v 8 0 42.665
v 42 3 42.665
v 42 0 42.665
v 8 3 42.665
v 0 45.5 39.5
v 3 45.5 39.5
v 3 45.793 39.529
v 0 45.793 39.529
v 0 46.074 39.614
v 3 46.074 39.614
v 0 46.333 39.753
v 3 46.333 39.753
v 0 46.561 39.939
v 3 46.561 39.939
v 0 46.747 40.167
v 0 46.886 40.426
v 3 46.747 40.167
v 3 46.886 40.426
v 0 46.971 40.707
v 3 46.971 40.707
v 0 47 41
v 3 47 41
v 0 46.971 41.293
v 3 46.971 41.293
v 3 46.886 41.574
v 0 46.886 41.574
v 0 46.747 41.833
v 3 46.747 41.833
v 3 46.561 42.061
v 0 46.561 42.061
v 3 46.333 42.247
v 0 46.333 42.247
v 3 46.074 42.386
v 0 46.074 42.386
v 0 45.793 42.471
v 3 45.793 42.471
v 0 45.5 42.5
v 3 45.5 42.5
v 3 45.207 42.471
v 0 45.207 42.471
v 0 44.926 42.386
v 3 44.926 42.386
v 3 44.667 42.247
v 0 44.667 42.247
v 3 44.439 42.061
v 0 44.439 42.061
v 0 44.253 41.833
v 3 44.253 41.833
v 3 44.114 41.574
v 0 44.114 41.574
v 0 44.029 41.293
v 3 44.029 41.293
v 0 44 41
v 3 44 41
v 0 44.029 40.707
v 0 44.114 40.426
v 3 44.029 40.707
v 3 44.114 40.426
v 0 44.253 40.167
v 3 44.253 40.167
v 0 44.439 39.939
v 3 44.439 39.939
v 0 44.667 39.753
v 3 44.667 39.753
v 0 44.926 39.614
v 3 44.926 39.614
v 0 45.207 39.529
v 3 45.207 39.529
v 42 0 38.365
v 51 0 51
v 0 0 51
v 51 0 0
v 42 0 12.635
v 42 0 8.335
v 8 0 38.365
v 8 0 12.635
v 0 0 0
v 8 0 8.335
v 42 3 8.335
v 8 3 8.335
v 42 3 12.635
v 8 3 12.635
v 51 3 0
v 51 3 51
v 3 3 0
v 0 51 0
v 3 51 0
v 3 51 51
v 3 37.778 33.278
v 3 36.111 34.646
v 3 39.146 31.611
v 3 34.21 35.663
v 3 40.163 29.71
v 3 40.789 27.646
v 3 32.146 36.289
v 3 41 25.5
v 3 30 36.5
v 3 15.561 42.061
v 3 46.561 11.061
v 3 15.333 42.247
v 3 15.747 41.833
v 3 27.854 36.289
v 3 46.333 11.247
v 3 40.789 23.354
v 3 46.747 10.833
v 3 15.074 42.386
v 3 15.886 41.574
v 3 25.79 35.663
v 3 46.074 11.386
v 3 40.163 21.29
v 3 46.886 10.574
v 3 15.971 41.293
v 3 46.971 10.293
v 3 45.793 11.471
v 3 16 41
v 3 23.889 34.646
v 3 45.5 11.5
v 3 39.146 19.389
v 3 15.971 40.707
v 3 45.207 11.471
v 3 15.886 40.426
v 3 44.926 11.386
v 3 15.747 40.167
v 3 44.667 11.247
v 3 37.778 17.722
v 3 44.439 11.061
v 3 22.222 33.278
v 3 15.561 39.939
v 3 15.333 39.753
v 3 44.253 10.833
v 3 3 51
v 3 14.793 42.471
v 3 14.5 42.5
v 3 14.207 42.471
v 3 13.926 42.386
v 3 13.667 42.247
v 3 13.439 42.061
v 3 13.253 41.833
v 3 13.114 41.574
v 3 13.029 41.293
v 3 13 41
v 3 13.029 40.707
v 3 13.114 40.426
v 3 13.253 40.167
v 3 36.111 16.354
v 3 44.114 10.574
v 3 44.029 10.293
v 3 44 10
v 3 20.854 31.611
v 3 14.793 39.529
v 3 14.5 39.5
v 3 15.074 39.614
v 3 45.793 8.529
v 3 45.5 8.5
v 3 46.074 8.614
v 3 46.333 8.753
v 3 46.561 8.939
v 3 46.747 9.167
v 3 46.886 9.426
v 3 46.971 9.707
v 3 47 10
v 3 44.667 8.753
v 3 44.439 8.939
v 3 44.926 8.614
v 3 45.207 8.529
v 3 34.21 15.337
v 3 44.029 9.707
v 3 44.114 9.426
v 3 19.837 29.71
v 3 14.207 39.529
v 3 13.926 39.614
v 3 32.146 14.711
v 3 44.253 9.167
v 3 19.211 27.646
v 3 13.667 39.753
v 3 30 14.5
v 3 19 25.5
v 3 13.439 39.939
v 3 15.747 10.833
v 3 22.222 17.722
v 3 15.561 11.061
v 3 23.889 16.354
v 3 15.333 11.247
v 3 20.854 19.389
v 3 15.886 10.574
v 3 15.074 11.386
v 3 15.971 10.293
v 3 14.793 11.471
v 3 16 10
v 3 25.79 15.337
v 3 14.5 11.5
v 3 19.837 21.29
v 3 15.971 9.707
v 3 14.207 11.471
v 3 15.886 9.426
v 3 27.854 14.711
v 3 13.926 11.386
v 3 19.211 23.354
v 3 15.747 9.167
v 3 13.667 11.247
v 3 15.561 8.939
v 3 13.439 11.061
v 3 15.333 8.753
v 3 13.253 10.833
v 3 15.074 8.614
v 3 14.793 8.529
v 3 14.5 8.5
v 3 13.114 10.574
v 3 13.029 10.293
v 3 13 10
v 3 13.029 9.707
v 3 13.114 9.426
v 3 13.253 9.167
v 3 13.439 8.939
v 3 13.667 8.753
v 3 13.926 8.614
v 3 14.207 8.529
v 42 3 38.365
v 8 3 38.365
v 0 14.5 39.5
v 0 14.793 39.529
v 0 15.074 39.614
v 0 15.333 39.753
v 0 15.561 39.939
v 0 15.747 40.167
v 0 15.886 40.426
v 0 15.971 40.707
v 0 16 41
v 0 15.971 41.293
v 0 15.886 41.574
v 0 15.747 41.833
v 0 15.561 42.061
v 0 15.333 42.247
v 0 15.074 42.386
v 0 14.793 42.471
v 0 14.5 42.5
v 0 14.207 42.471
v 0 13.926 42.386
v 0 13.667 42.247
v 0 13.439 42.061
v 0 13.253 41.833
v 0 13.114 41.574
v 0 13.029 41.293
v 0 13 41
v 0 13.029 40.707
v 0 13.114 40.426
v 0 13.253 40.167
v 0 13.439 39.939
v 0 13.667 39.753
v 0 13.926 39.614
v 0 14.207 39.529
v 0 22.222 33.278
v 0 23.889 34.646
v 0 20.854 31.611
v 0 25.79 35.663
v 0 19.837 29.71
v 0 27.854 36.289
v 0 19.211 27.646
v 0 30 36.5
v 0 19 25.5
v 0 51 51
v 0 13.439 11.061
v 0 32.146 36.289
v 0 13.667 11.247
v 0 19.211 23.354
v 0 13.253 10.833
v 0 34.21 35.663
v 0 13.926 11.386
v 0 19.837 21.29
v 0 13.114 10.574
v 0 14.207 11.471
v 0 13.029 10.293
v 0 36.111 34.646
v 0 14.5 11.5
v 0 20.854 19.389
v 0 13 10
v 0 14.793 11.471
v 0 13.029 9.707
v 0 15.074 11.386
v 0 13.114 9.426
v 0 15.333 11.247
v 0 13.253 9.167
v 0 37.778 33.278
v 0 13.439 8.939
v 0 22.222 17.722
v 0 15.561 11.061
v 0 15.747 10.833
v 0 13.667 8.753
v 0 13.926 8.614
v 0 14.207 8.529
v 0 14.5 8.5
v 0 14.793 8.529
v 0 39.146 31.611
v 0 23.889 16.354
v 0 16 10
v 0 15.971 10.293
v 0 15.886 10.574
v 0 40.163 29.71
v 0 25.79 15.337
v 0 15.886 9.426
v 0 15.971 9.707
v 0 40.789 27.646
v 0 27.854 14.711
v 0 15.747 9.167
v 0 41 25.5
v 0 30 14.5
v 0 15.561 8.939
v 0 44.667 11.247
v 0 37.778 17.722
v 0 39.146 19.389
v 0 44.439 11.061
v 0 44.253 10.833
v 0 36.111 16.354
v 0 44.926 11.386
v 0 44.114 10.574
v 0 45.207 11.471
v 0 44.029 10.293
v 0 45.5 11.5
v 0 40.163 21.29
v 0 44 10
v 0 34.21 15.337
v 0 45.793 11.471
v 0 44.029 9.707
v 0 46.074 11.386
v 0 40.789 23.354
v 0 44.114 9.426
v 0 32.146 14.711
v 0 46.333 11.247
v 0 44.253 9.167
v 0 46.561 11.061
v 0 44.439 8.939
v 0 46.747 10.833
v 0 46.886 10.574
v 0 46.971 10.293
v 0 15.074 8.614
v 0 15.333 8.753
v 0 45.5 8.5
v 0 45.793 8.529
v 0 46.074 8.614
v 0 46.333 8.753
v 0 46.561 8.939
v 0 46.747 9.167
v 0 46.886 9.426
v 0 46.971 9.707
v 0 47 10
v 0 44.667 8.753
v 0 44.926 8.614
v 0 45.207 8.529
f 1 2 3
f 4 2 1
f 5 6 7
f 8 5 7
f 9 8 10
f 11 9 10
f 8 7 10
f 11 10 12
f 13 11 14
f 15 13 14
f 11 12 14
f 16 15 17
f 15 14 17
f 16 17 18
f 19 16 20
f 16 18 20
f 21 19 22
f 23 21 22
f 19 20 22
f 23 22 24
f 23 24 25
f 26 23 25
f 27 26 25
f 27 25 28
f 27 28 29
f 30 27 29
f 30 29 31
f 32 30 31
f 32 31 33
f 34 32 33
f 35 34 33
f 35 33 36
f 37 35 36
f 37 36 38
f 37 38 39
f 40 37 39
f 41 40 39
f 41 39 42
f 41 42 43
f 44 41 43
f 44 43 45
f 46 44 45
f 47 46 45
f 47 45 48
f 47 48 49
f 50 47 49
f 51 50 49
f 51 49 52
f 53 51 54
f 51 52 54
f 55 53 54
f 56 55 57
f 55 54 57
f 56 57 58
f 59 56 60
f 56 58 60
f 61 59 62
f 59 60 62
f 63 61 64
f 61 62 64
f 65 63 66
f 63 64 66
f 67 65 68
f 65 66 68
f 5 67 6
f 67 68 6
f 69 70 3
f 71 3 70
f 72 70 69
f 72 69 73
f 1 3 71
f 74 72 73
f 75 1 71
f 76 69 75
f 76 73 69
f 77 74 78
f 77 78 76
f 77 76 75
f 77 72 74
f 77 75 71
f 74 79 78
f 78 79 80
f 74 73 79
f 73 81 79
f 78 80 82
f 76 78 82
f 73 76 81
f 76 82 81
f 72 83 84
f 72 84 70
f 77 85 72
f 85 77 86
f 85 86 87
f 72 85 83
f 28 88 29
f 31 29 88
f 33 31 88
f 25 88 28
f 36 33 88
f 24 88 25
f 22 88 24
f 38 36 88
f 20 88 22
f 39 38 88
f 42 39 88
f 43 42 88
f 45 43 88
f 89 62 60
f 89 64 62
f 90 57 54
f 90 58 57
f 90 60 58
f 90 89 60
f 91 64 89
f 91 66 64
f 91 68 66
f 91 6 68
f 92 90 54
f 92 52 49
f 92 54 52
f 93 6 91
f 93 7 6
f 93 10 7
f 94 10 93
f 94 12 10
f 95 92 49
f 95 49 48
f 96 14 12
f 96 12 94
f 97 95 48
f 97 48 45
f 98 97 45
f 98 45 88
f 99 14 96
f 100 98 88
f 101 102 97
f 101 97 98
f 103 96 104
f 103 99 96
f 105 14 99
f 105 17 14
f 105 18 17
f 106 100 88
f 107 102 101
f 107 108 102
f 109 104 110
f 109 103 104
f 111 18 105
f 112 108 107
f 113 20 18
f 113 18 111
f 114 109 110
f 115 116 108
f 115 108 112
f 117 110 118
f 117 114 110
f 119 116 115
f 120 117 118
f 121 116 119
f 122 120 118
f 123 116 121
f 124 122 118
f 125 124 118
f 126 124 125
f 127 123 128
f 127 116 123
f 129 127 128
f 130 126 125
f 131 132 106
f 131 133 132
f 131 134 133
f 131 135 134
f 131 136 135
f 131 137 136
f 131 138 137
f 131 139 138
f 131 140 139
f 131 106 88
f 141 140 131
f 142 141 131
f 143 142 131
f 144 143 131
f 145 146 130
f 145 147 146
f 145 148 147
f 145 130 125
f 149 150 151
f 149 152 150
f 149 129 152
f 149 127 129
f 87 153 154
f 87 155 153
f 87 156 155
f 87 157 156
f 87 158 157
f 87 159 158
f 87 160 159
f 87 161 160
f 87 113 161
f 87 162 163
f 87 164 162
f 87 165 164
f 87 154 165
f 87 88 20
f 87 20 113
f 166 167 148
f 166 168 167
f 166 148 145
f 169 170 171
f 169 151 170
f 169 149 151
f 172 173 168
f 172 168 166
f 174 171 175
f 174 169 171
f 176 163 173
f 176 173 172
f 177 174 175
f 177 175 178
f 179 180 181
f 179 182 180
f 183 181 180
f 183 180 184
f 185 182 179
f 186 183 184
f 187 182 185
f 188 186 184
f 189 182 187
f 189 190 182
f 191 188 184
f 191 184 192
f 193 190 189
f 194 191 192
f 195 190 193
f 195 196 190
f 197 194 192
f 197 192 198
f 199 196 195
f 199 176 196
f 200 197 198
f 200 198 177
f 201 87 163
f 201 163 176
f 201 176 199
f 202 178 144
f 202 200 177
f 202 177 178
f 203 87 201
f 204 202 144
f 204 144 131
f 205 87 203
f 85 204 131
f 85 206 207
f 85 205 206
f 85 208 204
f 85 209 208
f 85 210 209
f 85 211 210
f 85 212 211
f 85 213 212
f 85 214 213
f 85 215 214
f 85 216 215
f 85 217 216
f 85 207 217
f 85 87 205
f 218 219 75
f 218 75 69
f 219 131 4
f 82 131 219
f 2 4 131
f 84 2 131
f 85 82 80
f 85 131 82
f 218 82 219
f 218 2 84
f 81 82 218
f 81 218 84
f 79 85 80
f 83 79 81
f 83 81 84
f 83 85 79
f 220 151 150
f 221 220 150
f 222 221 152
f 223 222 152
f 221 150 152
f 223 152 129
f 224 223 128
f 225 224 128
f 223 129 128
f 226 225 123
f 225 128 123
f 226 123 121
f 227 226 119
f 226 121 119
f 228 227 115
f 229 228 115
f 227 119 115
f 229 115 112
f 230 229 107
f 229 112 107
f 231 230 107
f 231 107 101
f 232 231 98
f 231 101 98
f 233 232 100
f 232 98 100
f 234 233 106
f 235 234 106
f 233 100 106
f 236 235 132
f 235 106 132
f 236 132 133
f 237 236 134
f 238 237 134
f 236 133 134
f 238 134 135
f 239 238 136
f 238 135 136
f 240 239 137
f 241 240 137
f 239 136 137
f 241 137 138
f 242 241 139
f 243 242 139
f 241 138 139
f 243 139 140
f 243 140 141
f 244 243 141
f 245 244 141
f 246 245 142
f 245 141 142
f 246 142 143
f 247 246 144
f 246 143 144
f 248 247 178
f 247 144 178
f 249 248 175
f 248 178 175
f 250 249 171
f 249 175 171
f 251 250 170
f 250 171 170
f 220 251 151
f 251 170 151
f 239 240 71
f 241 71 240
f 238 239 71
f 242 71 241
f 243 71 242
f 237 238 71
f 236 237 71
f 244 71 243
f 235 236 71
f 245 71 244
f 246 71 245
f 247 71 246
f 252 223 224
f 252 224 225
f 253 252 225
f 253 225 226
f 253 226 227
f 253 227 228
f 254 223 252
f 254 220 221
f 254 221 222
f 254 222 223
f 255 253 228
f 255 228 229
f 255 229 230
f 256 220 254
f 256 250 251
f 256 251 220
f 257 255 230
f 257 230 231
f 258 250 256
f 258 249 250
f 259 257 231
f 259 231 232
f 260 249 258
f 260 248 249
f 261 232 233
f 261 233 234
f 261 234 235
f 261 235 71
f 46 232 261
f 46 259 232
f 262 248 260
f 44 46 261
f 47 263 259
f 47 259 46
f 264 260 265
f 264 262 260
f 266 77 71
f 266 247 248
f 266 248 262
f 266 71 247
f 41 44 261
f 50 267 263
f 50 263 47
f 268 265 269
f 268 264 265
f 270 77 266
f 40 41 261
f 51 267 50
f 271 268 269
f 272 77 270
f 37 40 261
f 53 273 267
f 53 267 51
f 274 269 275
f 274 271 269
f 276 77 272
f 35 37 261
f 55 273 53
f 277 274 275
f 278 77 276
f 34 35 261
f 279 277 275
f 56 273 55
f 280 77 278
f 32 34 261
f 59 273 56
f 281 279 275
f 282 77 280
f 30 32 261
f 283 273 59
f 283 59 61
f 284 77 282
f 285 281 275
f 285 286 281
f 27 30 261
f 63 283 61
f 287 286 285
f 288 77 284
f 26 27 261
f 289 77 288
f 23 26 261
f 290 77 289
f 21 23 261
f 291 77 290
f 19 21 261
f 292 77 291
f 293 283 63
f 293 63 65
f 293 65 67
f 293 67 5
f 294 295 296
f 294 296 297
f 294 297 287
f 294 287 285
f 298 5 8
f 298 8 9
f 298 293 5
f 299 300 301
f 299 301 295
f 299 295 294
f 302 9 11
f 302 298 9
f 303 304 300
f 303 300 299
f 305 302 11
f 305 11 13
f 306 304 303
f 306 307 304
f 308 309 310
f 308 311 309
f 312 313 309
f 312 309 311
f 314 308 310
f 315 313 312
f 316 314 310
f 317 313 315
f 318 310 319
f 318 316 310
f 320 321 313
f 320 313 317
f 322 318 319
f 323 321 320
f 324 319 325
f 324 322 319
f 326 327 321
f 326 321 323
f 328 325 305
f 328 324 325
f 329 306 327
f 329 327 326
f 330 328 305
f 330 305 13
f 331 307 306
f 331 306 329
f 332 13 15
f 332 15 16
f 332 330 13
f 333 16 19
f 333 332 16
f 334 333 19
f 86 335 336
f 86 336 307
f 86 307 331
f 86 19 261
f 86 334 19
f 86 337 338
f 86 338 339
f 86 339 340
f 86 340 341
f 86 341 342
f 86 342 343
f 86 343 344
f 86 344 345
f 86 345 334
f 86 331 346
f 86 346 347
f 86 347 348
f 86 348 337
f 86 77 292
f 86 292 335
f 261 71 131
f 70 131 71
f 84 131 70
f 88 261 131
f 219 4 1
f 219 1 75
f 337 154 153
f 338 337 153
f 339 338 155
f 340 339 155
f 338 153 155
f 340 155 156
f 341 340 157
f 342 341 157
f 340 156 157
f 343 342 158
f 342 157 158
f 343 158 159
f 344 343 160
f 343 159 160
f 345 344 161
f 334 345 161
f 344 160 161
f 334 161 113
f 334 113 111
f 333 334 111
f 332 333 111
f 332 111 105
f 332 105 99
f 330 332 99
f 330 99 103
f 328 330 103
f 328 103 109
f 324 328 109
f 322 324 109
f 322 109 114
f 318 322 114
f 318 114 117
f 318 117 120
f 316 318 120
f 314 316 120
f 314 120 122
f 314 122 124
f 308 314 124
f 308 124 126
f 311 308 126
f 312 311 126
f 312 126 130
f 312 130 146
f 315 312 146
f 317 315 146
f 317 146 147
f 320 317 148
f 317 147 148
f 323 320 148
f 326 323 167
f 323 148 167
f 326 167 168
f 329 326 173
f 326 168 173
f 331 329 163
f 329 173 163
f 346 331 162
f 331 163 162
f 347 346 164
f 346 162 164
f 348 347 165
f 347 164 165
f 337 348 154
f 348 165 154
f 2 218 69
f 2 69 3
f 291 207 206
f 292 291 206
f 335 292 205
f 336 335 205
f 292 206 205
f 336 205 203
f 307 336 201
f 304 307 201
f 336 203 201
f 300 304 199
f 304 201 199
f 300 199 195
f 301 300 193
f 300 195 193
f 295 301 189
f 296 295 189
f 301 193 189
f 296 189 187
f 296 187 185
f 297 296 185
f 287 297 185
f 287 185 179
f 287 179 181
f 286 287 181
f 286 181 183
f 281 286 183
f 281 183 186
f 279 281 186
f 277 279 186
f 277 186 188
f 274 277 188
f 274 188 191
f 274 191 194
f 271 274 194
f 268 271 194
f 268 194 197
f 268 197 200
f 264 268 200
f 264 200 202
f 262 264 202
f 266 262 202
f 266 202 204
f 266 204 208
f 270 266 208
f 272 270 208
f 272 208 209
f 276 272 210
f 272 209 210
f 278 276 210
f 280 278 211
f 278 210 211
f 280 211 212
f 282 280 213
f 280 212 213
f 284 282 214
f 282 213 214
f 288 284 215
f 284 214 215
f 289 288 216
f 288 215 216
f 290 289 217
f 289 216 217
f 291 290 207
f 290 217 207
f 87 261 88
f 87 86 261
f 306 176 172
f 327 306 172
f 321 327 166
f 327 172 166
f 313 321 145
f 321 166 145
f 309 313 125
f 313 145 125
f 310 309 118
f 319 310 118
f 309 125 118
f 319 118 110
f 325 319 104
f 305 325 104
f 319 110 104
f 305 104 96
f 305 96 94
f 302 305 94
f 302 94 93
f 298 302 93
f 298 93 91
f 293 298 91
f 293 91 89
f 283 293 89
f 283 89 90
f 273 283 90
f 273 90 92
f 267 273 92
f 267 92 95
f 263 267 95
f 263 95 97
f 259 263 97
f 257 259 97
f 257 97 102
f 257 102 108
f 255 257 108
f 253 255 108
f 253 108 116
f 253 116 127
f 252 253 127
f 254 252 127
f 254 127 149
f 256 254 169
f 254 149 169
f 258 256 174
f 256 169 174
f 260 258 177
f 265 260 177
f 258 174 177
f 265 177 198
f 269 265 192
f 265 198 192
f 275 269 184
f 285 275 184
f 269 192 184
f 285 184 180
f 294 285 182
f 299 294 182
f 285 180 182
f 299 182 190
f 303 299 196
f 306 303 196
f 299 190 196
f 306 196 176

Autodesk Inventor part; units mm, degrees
ref_plane "YZ Plane" through (0, 0, 0) normal (1, 0, 0) x (0, 1, 0)
ref_plane "XZ Plane" through (0, 0, 0) normal (0, 1, 0) x (-1, 0, 0)
ref_plane "XY Plane" through (0, 0, 0) normal (0, 0, 1) x (1, 0, 0)
sketch "Sketch1" plane through (0, 0, 0) normal (0, 0, 1) x (1, 0, 0)
  line L0 (0, 0) -> (0, 51)
  line L1 (0, 51) -> (3, 51)
  line L2 (3, 51) -> (3, 3)
  line L3 (3, 3) -> (51, 3)
  line L4 (51, 3) -> (51, 0)
  line L5 (51, 0) -> (0, 0)
  dimension "d0" = 51
  dimension "d1" = 3
  dimension "d2" = 48
  dimension "d3" = 48
extrude "Extrusion1" add sketch "Sketch1" along normal blind 51
sketch "Sketch2" plane through (3, 3, 0) normal (1, 0, 0) x (0, 0, -1)
  line L0 (0, 48) -> (-51, 48) projected
  circle A0 centre (-25.5, 27) radius 11
  circle A1 centre (-41, 42.5) radius 1.5
  circle A2 centre (-10, 42.5) radius 1.5
  circle A3 centre (-10, 11.5) radius 1.5
  circle A4 centre (-41, 11.5) radius 1.5
  point P0 (0, -3)
  dimension "d7" = 22
  dimension "d12" = 3
  dimension "d13" = 3
extrude "Extrusion2" cut sketch "Sketch2" against normal up to surface (3 mm away)
sketch "Sketch3" plane through (3, 3, 0) normal (0, 1, 0) x (1, 0, 0)
  line L0 (48, 0) -> (48, -51) projected
  line L1 (48, -25.5) -> (48, -12.635)
  line L2 (48, -12.635) -> (48, -10.485)
  line L3 (48, -10.485) -> (39, -10.485)
  line L4 (-3, 0) -> (48, 0) projected
  line L5 (39, 0) -> (39, -7.85)
  line L6 (39, 0) -> (46.85, 0) construction
  line L7 (39, -10.485) -> (39, -8.335)
  line L8 (39, -8.335) -> (5, -8.335)
  line L9 (5, -8.335) -> (5, -12.635)
  line L10 (5, -12.635) -> (39, -12.635)
  line L11 (39, -12.635) -> (39, -10.485)
  line L12 (48, -25.5) -> (-0.1529, -25.5)
  line L13 (39, -40.515) -> (39, -42.665)
  line L14 (39, -42.665) -> (5, -42.665)
  line L15 (5, -42.665) -> (5, -38.365)
  line L16 (5, -38.365) -> (39, -38.365)
  line L17 (39, -38.365) -> (39, -40.515)
  point P0 (39, -43.15)
  dimension "d16" = 12.865
  dimension "d17" = 2.15
  dimension "d18" = 9
  dimension "d20" = 7.85
  dimension "d21" = 270
  dimension "d22" = 2.15
  dimension "d23" = 4.3
extrude "Extrusion3" cut sketch "Sketch3" against normal through all
properties part number "Metal_AttachmentBracket"
